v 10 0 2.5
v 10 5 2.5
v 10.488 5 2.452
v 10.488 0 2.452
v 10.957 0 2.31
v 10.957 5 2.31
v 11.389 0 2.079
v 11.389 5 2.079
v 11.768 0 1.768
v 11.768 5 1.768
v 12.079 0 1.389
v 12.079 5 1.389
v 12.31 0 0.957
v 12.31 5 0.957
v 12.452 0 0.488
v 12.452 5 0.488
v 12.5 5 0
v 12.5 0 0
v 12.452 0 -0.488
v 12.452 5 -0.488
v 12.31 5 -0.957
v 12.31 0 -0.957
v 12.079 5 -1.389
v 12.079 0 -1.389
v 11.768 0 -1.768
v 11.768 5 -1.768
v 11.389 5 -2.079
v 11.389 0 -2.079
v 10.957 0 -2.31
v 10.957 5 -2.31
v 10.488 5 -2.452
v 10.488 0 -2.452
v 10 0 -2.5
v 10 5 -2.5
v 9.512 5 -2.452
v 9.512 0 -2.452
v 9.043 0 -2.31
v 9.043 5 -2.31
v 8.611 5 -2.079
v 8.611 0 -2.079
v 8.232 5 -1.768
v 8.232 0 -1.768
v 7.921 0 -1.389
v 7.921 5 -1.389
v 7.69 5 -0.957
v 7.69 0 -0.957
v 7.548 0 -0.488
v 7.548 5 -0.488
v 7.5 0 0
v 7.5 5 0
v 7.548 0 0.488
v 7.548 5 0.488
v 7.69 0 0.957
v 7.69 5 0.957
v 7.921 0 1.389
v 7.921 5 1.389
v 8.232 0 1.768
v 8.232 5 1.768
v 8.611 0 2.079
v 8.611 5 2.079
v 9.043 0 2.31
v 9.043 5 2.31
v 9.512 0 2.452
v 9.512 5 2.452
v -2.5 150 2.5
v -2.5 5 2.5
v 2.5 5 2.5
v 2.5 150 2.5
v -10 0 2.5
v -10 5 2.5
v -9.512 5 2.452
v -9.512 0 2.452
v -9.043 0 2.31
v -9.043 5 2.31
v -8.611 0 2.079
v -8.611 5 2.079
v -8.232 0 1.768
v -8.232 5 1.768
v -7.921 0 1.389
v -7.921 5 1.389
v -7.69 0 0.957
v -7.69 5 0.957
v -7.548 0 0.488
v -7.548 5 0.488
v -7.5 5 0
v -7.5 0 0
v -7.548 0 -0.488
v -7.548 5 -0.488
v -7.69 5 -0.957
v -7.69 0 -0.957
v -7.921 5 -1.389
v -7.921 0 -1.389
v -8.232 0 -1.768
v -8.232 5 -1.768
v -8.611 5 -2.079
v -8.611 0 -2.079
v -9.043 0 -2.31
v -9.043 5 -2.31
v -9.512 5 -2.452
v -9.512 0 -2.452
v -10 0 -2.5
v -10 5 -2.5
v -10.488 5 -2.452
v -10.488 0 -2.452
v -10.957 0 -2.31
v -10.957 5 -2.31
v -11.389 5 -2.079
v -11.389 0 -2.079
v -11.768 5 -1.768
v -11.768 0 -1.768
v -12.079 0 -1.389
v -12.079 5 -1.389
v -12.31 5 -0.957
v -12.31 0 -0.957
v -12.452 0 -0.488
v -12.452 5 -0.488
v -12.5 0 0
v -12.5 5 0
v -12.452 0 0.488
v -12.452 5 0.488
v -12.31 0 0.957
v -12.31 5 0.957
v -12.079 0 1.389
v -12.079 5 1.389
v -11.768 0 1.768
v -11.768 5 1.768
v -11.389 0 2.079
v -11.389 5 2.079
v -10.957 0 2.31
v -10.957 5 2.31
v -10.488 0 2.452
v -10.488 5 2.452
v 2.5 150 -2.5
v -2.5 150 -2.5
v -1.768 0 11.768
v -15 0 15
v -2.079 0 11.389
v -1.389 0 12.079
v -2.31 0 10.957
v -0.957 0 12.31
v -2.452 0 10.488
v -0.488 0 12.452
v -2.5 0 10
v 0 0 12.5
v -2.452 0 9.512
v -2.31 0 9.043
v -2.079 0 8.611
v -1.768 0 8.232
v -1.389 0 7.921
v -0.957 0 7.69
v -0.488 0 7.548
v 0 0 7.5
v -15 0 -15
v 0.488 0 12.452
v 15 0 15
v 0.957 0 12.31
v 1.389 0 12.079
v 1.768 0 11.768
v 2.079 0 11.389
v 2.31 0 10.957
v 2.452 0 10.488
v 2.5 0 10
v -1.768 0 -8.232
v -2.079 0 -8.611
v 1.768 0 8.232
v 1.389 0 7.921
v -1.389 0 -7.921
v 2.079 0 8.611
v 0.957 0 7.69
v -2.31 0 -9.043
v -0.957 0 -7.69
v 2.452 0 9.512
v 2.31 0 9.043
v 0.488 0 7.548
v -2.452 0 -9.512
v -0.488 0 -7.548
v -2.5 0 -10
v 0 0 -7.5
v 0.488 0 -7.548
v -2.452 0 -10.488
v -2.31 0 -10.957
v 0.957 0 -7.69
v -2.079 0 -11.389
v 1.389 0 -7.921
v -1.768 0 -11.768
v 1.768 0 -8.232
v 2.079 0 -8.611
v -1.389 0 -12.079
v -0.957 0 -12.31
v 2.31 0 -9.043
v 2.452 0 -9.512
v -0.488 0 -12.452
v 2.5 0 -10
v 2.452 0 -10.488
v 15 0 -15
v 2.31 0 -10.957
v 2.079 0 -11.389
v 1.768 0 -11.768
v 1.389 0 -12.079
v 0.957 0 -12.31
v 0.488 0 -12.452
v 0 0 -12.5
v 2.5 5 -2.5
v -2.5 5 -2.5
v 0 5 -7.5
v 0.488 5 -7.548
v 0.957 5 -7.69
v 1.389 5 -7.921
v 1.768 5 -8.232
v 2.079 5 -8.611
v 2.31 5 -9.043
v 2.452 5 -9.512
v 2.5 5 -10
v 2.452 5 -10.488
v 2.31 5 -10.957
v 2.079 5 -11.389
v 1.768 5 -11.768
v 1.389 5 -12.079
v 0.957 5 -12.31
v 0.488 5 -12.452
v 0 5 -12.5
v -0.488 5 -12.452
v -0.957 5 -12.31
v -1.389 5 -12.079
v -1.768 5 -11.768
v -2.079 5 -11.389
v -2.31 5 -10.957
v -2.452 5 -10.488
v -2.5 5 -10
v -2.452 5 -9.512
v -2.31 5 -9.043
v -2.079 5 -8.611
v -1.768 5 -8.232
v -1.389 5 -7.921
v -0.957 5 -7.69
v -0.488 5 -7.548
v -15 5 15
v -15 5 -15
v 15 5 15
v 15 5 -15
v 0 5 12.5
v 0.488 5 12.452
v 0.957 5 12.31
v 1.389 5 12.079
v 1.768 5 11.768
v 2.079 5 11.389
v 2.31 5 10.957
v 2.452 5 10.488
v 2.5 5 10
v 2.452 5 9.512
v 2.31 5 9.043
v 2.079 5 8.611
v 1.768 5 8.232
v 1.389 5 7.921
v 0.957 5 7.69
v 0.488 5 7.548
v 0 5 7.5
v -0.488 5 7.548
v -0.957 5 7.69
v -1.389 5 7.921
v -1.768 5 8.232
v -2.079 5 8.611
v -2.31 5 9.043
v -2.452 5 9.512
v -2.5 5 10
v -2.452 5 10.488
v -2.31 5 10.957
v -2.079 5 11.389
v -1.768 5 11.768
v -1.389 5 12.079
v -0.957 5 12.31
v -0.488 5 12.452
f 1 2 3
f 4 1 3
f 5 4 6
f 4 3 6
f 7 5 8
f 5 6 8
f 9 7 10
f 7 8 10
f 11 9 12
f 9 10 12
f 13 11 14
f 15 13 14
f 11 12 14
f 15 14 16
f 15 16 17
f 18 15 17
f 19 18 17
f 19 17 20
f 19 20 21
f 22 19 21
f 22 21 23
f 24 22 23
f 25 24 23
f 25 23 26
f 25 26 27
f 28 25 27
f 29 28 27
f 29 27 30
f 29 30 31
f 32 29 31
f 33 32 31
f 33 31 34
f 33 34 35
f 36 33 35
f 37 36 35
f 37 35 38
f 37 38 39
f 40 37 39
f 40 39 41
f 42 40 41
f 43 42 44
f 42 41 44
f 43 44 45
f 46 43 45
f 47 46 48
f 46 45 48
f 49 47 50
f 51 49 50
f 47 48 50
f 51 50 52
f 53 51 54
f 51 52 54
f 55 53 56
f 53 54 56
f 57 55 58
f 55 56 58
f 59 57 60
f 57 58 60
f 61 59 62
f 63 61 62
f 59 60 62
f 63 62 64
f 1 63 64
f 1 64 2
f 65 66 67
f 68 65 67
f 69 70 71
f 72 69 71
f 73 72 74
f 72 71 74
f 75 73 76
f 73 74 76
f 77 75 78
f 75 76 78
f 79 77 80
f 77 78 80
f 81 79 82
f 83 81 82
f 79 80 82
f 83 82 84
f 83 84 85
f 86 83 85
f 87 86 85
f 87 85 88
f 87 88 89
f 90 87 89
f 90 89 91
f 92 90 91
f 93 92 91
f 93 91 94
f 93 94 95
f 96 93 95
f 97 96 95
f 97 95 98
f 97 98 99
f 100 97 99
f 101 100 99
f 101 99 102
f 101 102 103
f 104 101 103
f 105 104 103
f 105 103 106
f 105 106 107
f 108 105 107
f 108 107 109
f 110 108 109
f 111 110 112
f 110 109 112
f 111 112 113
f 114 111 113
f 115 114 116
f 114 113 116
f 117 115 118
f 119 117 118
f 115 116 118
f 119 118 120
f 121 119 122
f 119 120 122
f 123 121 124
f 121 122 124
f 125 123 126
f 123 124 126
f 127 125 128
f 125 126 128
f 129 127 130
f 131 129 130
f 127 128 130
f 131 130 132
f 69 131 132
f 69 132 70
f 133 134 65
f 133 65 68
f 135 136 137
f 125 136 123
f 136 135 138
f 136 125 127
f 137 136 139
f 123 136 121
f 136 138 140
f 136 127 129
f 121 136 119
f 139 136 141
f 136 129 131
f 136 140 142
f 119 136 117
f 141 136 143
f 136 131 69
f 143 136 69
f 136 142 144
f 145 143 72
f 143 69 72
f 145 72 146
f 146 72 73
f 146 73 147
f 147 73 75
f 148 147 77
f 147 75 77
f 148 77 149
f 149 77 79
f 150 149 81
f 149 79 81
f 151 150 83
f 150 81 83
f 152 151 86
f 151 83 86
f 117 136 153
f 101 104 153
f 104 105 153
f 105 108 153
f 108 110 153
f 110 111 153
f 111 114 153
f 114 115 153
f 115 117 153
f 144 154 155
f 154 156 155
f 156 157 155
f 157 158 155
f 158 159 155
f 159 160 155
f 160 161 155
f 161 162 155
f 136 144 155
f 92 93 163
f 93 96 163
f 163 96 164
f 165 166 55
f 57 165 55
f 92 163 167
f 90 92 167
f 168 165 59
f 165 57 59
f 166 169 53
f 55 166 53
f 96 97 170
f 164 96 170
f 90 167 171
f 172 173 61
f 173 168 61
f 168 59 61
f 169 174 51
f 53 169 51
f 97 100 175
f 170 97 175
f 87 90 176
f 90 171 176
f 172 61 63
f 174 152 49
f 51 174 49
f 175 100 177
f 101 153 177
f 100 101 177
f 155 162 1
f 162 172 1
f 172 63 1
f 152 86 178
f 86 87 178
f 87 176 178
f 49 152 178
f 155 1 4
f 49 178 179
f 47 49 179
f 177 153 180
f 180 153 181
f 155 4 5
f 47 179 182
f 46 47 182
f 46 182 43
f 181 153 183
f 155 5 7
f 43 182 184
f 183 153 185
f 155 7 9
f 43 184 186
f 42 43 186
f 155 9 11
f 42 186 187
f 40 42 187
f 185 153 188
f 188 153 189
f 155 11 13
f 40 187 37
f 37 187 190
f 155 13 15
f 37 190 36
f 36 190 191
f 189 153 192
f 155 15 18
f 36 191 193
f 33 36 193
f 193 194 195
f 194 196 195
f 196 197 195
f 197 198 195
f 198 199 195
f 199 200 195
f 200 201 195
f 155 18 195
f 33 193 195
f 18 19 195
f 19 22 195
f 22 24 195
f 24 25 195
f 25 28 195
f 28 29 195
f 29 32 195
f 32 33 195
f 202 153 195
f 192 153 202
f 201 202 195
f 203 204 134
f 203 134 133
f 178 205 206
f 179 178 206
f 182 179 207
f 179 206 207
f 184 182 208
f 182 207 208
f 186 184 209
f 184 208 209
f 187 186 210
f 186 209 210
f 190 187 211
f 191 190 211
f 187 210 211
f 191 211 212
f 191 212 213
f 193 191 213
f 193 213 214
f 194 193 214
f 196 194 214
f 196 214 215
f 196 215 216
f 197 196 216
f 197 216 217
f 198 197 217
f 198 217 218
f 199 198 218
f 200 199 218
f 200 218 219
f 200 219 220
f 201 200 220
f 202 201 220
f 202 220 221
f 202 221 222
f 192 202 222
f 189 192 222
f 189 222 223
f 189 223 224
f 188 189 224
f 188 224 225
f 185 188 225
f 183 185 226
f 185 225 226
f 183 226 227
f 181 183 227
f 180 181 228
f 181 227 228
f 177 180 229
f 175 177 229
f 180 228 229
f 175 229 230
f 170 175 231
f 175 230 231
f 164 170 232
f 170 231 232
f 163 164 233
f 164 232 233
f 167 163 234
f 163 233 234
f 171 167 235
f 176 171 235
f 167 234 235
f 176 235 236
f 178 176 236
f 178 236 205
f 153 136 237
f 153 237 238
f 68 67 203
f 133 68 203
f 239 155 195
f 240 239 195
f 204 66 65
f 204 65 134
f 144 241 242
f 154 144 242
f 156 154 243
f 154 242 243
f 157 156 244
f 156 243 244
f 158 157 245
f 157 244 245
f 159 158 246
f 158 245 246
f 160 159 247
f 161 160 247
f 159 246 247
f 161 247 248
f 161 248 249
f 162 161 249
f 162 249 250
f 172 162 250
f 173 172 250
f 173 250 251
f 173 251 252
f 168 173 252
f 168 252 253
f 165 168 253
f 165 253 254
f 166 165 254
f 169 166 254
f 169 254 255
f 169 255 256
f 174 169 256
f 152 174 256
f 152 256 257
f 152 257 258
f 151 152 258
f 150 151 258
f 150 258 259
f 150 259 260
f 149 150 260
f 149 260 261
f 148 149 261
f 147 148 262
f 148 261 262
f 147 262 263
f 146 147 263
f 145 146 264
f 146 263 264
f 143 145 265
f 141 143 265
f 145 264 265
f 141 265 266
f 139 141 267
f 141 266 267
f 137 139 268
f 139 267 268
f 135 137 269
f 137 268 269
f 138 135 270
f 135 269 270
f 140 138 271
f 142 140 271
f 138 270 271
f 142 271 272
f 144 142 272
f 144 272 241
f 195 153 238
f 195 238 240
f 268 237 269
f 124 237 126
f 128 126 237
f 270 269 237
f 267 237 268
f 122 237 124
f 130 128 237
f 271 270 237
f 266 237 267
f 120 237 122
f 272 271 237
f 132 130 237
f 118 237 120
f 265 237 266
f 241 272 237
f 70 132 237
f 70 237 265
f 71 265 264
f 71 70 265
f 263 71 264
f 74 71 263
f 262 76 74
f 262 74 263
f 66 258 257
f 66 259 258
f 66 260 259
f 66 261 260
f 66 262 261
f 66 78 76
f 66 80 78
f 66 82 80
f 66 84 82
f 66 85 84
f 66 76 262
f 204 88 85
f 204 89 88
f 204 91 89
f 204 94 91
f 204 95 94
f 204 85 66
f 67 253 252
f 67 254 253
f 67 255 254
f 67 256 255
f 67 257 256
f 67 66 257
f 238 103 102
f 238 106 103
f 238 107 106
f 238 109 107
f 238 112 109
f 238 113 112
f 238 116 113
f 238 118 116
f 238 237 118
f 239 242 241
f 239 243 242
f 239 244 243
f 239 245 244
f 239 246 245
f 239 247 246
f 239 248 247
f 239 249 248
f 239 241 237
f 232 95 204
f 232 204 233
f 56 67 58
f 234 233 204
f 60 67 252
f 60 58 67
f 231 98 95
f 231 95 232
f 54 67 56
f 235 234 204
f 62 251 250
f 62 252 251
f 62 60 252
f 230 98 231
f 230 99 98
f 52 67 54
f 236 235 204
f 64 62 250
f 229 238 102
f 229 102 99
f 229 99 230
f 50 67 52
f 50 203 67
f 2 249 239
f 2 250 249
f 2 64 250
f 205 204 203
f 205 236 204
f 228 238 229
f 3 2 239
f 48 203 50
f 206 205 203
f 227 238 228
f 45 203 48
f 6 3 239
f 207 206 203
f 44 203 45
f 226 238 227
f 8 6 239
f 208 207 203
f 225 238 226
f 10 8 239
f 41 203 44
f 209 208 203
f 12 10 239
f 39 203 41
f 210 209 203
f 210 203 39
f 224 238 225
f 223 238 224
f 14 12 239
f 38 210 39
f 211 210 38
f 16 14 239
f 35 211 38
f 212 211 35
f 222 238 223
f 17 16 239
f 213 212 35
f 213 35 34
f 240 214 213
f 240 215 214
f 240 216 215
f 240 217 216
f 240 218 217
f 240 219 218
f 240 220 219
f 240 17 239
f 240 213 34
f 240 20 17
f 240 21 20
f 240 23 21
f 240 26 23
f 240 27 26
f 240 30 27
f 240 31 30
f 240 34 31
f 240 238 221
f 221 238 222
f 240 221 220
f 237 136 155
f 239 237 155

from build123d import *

# Parameters (mm, degrees)
SKETCH5_W           = 30
SKETCH5_H           = 30
BOSS_EXTRUDE1_DEPTH = 5
SKETCH5_3_W         = 5
SKETCH5_3_H         = 5
BOSS_EXTRUDE2_DEPTH = 150
CUT_EXTRUDE2_REACH  = 148.544
SKETCH6_R           = 2.5


with BuildPart() as part:
    # Sketch5 → Boss-Extrude1 (new body)
    with BuildSketch(Plane(origin=(0, 0, 0), x_dir=(1, 0, 0), z_dir=(0, 1, 0))):
        Rectangle(SKETCH5_W, SKETCH5_H)
    extrude(amount=BOSS_EXTRUDE1_DEPTH)

    # Sketch5<3> → Boss-Extrude2 (add)
    with BuildSketch(Plane(origin=(0, 0, 0), x_dir=(1, 0, 0), z_dir=(0, 1, 0))):
        Rectangle(SKETCH5_3_W, SKETCH5_3_H)
    extrude(amount=BOSS_EXTRUDE2_DEPTH)

    # Sketch6 → Cut-Extrude2 (cut, up to next)
    with BuildSketch(Plane(origin=(0, 5, 0), x_dir=(1, 0, 0), z_dir=(0, 1, 0)), mode=Mode.PRIVATE) as cut_extrude2_sk1:
        with Locations((0, 10)):
            Circle(SKETCH6_R)
    cut_extrude2_tool1 = extrude(cut_extrude2_sk1.sketch, amount=-CUT_EXTRUDE2_REACH, mode=Mode.PRIVATE) & part.part
    # Sketch6 → Cut-Extrude2 (cut, up to next)
    with BuildSketch(Plane(origin=(0, 5, 0), x_dir=(1, 0, 0), z_dir=(0, 1, 0)), mode=Mode.PRIVATE) as cut_extrude2_sk2:
        with Locations((10, 0)):
            Circle(SKETCH6_R)
    cut_extrude2_tool2 = extrude(cut_extrude2_sk2.sketch, amount=-CUT_EXTRUDE2_REACH, mode=Mode.PRIVATE) & part.part
    # Sketch6 → Cut-Extrude2 (cut, up to next)
    with BuildSketch(Plane(origin=(0, 5, 0), x_dir=(1, 0, 0), z_dir=(0, 1, 0)), mode=Mode.PRIVATE) as cut_extrude2_sk3:
        with Locations((0, -10)):
            Circle(SKETCH6_R)
    cut_extrude2_tool3 = extrude(cut_extrude2_sk3.sketch, amount=-CUT_EXTRUDE2_REACH, mode=Mode.PRIVATE) & part.part
    # Sketch6 → Cut-Extrude2 (cut, up to next)
    with BuildSketch(Plane(origin=(0, 5, 0), x_dir=(1, 0, 0), z_dir=(0, 1, 0)), mode=Mode.PRIVATE) as cut_extrude2_sk4:
        with Locations((-10, 0)):
            Circle(SKETCH6_R)
    cut_extrude2_tool4 = extrude(cut_extrude2_sk4.sketch, amount=-CUT_EXTRUDE2_REACH, mode=Mode.PRIVATE) & part.part
    add(cut_extrude2_tool1.solids().sort_by_distance((0, 5, -10))[0], mode=Mode.SUBTRACT)
    add(cut_extrude2_tool2.solids().sort_by_distance((10, 5, 0))[0], mode=Mode.SUBTRACT)
    add(cut_extrude2_tool3.solids().sort_by_distance((0, 5, 10))[0], mode=Mode.SUBTRACT)
    add(cut_extrude2_tool4.solids().sort_by_distance((-10, 5, 0))[0], mode=Mode.SUBTRACT)


solid = part.part
